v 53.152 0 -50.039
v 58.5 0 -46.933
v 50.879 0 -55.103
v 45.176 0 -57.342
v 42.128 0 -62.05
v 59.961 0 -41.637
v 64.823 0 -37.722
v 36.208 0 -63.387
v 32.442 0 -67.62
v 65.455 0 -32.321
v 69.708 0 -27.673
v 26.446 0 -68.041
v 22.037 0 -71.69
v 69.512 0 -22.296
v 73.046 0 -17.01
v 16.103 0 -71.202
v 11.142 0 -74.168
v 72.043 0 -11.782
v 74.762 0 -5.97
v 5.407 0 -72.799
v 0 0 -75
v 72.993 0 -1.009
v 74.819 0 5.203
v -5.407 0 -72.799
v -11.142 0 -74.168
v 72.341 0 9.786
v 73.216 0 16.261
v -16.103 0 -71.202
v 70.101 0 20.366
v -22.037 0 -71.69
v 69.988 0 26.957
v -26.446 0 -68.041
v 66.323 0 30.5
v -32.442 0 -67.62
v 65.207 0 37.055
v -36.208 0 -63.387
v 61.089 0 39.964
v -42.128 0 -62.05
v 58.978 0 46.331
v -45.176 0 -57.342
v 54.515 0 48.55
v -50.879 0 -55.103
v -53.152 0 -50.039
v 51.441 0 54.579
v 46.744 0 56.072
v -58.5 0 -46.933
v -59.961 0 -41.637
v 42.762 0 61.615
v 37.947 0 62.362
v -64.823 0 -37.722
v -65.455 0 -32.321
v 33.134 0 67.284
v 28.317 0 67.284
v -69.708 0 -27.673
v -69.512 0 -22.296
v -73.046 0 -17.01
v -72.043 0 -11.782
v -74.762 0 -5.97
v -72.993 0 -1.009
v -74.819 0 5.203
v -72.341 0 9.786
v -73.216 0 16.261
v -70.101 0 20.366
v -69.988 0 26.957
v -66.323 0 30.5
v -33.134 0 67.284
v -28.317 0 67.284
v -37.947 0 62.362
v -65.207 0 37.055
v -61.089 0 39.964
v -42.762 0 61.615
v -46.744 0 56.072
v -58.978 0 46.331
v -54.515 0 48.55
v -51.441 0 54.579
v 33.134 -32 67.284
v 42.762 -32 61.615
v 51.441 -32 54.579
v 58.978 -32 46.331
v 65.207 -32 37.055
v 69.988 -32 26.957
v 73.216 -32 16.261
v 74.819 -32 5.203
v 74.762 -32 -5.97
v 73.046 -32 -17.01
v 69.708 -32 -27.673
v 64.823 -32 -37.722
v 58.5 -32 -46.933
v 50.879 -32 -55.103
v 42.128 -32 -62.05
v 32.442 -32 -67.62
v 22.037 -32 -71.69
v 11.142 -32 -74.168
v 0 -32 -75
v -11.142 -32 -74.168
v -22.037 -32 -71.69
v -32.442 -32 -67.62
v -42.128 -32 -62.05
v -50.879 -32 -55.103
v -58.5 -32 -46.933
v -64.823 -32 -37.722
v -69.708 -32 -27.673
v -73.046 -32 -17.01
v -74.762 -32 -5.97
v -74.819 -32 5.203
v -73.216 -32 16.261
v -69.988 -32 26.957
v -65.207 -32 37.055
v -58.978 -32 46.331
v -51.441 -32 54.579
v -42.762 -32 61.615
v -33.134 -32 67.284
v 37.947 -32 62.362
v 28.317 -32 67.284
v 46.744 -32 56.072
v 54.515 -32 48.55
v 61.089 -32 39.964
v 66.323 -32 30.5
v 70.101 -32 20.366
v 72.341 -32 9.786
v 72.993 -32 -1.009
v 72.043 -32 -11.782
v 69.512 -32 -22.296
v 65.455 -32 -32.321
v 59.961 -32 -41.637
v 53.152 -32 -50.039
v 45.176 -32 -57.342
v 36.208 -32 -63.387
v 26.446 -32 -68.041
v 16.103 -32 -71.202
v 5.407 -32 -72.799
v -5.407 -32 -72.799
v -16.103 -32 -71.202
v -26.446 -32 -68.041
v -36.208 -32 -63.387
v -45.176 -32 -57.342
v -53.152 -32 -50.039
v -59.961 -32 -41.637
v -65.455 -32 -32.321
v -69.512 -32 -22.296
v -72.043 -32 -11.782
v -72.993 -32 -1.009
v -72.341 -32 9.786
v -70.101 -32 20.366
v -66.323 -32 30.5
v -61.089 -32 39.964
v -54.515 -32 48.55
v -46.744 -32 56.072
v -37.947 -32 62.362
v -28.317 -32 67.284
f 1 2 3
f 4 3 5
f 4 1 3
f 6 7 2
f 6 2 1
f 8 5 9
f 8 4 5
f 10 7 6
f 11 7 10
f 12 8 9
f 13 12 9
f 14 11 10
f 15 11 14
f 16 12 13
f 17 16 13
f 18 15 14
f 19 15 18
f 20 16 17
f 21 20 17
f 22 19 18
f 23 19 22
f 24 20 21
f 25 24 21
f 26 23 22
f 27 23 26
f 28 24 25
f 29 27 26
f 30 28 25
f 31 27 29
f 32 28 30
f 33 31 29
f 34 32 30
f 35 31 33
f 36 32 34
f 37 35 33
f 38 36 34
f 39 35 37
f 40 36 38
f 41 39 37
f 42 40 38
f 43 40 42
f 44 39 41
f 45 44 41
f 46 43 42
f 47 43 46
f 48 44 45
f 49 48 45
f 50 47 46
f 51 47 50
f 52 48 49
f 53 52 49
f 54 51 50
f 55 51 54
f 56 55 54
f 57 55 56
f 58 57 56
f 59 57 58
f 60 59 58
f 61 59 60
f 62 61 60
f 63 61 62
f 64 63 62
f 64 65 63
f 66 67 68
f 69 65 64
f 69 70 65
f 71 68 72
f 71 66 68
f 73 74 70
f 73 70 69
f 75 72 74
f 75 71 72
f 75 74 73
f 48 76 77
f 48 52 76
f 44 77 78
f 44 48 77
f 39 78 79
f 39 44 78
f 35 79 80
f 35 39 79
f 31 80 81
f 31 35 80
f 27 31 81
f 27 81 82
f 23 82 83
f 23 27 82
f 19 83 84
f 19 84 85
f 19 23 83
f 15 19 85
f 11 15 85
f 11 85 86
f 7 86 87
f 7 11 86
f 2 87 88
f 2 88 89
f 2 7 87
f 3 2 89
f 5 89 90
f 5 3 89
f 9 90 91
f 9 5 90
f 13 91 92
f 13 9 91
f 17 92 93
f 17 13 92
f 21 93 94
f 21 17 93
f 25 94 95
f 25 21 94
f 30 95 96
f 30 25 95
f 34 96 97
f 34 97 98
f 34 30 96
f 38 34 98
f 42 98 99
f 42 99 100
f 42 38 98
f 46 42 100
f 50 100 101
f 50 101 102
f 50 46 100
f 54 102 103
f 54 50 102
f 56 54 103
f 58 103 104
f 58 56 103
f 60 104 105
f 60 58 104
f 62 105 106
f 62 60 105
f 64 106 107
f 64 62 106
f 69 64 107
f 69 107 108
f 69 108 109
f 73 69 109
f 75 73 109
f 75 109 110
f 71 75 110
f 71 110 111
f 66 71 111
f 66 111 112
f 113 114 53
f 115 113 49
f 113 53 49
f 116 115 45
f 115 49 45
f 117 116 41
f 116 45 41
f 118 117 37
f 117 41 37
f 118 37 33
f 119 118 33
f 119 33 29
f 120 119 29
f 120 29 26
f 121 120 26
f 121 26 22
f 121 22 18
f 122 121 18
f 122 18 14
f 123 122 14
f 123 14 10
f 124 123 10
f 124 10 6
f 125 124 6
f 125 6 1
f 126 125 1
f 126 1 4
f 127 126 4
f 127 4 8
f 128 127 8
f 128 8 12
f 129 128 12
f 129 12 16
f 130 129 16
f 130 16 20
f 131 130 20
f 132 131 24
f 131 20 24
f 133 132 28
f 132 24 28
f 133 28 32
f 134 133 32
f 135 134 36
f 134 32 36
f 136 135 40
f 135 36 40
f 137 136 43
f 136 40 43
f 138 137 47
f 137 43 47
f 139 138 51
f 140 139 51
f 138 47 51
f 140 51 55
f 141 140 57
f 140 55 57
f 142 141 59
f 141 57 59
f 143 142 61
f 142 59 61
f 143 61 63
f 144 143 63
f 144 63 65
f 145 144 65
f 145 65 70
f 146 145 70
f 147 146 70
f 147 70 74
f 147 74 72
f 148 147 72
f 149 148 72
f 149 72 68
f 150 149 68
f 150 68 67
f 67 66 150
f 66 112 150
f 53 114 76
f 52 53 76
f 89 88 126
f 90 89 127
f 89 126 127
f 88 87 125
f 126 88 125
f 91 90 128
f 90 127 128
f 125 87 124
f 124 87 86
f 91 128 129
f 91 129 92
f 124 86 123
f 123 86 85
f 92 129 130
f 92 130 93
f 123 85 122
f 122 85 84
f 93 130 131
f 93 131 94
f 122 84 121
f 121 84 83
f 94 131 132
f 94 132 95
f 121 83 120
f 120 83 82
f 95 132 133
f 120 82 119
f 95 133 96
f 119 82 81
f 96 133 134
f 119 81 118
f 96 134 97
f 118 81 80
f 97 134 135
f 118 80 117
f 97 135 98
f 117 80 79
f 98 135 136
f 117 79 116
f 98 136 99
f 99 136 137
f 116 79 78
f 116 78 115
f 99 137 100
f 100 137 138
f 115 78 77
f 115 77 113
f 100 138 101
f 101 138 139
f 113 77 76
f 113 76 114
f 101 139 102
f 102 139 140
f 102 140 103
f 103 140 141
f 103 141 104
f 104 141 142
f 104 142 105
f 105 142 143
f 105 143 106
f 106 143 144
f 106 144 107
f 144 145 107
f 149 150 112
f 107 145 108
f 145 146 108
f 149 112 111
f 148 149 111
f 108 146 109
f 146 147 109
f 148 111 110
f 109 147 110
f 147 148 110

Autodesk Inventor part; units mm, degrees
ref_plane "YZ Plane" through (0, 0, 0) normal (1, 0, 0) x (0, 1, 0)
ref_plane "XZ Plane" through (0, 0, 0) normal (0, 1, 0) x (-1, 0, 0)
ref_plane "XY Plane" through (0, 0, 0) normal (0, 0, 1) x (1, 0, 0)
sketch "Boceto2" plane through (0, 0, 0) normal (0, 1, 0) x (-1, 0, 0)
  arc A0 (-18, 72.808) -> (20, 72.2842) centre (0, 0) ccw
  line L0 (-18, 72.808) -> (-18, 72.2842)
  line L1 (20, 72.2842) -> (13, 72.2842)
  line L2 (-18, 72.808) -> (-11, 72.808)
  line L3 (-11, 72.808) -> (-11, 72.2842)
  line L4 (-18, 72.2842) -> (-18, 72.808)
  line L5 (20, 72.2842) -> (13, 72.2842) projected
  line L6 (13, 72.2842) -> (20, 72.2842)
  line L7 (64.5832, 27.0002) -> (13, 27.0002)
  line L8 (13, 27.0002) -> (13, 72.2842)
  line L9 (-11, 72.2842) -> (-20, 72.2842)
  line L10 (-64.5832, 27.0002) -> (-11, 27.0002)
  line L11 (-11, 27.0002) -> (-11, 72.2842)
  arc A1 (69.8214, 4.9968) -> (69.8214, -4.9968) centre (70, 0) ccw
  arc A2 (-69.8214, -4.9968) -> (-69.8214, 4.9968) centre (-70, 0) ccw
  arc A3 (4.9968, -69.8214) -> (-4.9968, -69.8214) centre (0, -70) ccw
  arc A4 (4.9968, -69.8214) -> (69.8214, -4.9968) centre (0, 0) ccw
  arc A5 (69.8214, 4.9968) -> (64.5832, 27.0002) centre (0, 0) ccw
  arc A6 (-64.5832, 27.0002) -> (-69.8214, 4.9968) centre (0, 0) ccw
  arc A7 (-69.8214, -4.9968) -> (-4.9968, -69.8214) centre (0, 0) ccw
  dimension "d14" = 150
  dimension "d45" = 10
  dimension "d46" = 10
  dimension "d47" = 10
extrude "Extrusión2" add sketch "Boceto2" against normal blind 32 contours L9 L11 L10 A6 A2 A7 A3 A4 A1 A5 L7 L8 L1 A0
sketch "Boceto8" plane through (0, 0, 0) normal (0, 1, 0) x (-1, 0, 0)
  line L0 (59.5508, 67.2842) -> (-59.748, 67.2842)
  line L1 (-59.748, 67.2842) -> (-59.748, 82.2842)
  line L2 (-59.748, 82.2842) -> (59.5508, 82.2842)
  line L3 (59.5508, 82.2842) -> (59.5508, 67.2842)
  line L4 (13, 72.2842) -> (20, 72.2842) projected
  point P0 (0, 0)
  dimension "d67" = 15
  dimension "d71" = 5
extrude "Extrusión8" cut sketch "Boceto8" along normal mid plane 70
sketch "Boceto9" plane through (0, 0, 0) normal (0, 1, 0) x (-1, 0, 0)
  line L0 (-64.5832, 27.0002) -> (-11, 27.0002) projected
  line L1 (-23, 27.0002) -> (-64.5832, 27.0002)
  line L2 (-40.2309, 57.2842) -> (-23, 57.2842)
  line L3 (-23, 57.2842) -> (-23, 27.0002)
  line L4 (-11, 67.2842) -> (-11, 27.0002) projected
  line L5 (-33.1337, 67.2842) -> (-11, 67.2842) projected
  line L6 (25, 27.0002) -> (64.5832, 27.0002)
  line L7 (40.2309, 57.2842) -> (25, 57.2842)
  line L8 (25, 57.2842) -> (25, 27.0002)
  line L9 (13, 27.0002) -> (13, 67.2842) projected
  line L10 (13, 67.2842) -> (33.1337, 67.2842) projected
  arc A0 (-40.2309, 57.2842) -> (-64.5832, 27.0002) centre (0, 0) ccw
  arc A1 (64.5832, 27.0002) -> (40.2309, 57.2842) centre (0, 0) ccw
  dimension "d73" = 12
  dimension "d76" = 10
  dimension "d77" = 12
  dimension "d78" = 10
extrude "Extrusión9" cut sketch "Boceto9" against normal blind 32
sketch "Boceto15" plane through (0, 0, 0) normal (0, 1, 0) x (-1, 0, 0)
  circle A0 centre (0, 0) radius 73
  dimension "d126" = 146
extrude "Extrusión15" cut sketch "Boceto15" against normal blind 32
properties part number "Cuerpo" material "Aluminio 6061"
